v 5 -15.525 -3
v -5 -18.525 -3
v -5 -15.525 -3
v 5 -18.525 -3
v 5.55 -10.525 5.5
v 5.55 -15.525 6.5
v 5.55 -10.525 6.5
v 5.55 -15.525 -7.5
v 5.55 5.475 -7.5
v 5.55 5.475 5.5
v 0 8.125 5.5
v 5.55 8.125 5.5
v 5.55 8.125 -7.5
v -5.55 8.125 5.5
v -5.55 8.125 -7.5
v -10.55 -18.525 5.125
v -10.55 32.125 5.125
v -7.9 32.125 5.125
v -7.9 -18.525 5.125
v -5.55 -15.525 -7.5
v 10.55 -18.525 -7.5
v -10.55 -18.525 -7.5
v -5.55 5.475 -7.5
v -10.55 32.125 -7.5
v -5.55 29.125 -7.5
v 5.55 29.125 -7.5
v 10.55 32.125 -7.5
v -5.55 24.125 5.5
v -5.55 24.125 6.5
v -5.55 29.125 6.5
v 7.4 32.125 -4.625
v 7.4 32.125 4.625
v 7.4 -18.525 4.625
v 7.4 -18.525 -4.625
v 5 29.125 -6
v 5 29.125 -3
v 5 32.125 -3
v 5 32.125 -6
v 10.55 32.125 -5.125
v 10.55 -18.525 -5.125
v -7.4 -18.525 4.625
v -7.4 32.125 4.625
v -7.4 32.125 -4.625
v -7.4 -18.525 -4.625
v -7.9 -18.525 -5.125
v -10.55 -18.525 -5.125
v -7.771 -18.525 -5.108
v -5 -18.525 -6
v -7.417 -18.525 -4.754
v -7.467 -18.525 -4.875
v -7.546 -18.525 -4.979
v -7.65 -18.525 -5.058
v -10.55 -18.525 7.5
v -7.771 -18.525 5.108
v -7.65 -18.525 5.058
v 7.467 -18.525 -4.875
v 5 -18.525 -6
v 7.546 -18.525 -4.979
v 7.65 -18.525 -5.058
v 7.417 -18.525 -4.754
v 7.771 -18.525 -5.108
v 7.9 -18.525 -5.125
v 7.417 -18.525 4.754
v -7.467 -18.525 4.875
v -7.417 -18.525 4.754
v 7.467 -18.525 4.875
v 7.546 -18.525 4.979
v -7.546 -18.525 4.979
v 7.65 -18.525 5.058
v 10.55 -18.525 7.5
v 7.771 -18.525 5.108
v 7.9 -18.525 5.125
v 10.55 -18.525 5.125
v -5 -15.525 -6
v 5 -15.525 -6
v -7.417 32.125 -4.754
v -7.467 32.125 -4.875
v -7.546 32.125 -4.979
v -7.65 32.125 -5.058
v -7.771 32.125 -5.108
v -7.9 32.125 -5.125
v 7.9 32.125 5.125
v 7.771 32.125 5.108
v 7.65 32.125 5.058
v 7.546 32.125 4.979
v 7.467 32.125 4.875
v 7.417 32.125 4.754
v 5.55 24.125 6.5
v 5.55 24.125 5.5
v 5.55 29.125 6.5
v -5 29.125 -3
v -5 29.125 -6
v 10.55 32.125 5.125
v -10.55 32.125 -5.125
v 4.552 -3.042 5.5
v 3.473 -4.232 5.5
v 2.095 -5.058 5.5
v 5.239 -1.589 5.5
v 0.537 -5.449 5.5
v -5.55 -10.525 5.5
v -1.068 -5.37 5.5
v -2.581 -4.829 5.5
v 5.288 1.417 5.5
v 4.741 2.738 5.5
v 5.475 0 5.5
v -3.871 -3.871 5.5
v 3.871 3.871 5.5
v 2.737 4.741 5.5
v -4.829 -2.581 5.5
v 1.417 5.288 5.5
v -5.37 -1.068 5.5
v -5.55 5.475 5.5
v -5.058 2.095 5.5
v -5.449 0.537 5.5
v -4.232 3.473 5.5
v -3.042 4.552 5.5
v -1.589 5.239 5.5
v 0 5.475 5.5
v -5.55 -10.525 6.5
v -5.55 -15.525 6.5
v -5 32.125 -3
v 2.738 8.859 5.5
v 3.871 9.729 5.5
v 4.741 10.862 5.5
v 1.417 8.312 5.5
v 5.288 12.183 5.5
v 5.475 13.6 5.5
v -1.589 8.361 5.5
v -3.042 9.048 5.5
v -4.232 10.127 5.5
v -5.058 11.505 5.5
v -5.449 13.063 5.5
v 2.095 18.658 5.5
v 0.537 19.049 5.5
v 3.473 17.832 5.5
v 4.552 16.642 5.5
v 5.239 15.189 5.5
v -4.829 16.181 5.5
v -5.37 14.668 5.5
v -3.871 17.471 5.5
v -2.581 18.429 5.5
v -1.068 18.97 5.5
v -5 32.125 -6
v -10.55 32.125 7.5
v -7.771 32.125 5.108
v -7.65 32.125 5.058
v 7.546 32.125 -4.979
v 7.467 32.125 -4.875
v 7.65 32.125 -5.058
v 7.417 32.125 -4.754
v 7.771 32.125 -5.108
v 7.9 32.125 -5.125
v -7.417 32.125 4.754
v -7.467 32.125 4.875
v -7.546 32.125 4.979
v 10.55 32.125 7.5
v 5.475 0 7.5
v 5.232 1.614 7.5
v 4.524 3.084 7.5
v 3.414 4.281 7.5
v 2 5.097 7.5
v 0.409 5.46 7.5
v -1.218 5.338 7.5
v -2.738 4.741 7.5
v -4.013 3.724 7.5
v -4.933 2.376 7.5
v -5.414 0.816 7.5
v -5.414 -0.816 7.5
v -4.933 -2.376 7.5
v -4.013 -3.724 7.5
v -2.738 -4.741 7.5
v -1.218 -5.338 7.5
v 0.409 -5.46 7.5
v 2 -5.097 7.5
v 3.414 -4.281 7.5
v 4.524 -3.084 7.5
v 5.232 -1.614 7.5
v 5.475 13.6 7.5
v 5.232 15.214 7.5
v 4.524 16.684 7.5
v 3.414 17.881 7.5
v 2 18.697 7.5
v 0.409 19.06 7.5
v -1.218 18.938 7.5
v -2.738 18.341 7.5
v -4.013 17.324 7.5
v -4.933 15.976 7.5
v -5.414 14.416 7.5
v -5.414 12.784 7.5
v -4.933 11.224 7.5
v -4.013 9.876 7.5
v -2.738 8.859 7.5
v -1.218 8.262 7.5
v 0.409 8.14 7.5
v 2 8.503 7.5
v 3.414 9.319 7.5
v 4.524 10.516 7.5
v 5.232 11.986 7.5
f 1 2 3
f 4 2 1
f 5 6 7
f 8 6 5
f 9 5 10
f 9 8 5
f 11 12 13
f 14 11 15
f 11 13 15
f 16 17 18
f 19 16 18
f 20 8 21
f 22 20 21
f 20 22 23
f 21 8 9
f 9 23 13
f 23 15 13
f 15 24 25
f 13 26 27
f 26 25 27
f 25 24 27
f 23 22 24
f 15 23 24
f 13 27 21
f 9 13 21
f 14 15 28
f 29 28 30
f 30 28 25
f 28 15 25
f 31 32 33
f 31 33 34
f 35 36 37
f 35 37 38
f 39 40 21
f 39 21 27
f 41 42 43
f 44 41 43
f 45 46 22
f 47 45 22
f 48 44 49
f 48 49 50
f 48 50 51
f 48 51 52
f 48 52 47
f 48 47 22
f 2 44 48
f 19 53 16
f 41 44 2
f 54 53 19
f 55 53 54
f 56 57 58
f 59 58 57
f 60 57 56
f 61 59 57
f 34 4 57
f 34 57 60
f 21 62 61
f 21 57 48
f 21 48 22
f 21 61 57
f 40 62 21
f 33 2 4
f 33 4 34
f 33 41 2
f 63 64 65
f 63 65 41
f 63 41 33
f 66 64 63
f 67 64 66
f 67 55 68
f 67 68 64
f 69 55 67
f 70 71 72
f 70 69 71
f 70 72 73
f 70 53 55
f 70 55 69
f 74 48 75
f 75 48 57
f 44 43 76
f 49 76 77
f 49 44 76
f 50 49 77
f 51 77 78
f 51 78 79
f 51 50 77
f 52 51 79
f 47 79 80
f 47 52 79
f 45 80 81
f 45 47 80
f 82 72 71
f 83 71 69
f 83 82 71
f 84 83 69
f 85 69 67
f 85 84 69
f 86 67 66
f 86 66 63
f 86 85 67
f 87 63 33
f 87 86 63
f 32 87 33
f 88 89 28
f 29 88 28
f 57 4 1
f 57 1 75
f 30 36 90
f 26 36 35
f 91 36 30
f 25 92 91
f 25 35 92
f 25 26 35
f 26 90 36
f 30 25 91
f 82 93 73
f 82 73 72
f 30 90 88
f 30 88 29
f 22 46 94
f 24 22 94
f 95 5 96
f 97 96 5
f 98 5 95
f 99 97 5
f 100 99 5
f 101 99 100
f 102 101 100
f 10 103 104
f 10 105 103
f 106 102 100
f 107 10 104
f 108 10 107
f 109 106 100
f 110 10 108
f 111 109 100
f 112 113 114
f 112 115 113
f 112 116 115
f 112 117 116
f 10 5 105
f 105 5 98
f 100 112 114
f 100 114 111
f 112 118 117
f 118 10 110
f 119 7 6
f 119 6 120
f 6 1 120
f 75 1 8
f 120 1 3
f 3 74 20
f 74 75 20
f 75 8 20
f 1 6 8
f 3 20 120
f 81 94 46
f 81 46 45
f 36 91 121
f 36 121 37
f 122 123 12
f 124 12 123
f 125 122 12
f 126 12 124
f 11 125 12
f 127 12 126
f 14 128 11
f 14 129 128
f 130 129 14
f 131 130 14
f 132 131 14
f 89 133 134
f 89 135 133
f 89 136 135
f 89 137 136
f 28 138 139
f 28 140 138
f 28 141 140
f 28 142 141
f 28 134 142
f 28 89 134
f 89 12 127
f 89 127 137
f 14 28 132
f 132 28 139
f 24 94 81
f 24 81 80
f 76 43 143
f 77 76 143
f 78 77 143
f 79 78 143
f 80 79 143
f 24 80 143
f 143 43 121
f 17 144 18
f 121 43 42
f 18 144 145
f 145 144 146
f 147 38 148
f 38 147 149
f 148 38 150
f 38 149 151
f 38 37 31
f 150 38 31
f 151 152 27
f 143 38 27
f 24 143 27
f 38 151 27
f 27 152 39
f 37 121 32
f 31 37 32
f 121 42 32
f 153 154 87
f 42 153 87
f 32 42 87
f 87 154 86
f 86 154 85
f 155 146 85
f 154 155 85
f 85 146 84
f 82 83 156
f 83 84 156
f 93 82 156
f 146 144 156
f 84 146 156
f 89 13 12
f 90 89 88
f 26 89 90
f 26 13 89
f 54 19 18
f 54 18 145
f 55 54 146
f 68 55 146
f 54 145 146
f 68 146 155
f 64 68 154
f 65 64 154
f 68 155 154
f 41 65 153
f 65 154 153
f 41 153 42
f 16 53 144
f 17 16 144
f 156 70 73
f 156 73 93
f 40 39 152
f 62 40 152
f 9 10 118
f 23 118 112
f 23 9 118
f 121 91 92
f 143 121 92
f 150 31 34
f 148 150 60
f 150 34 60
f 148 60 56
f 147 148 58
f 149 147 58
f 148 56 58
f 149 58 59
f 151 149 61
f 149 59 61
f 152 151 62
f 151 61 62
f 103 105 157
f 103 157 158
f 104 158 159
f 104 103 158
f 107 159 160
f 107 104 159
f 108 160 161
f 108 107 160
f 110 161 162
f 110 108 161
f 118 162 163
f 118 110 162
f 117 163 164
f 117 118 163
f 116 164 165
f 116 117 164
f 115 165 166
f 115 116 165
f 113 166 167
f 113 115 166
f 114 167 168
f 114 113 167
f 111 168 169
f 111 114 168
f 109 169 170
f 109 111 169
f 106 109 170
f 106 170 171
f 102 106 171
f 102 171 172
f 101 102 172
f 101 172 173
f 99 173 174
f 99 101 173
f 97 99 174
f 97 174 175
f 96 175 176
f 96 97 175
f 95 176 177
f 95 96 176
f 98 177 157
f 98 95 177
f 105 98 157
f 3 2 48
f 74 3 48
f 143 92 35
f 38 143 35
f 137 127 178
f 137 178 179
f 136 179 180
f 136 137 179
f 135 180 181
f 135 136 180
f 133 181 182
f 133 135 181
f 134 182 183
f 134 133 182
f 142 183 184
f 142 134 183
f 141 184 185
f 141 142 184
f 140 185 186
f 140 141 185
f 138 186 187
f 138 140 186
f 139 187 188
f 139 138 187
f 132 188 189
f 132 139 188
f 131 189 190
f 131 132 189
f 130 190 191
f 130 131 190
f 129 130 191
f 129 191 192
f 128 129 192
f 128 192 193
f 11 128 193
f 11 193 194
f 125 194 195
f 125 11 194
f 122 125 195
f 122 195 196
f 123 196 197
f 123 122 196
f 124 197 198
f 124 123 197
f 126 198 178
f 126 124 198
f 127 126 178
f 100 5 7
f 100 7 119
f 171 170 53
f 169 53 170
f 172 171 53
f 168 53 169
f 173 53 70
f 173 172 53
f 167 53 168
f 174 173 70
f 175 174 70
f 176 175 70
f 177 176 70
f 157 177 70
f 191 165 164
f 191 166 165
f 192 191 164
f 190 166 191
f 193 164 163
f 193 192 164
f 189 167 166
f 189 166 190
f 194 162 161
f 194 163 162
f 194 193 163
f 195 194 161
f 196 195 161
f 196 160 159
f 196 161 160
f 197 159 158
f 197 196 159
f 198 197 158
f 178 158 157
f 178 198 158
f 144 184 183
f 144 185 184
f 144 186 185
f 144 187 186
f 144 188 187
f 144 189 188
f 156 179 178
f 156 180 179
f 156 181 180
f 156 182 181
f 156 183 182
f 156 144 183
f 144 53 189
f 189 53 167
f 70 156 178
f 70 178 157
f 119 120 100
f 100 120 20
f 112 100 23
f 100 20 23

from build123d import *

# Parameters (mm, degrees)
SKETCH2_W               = 21.1
SKETCH2_H               = 50.65
SKETCH2_R               = 5.475
BOSS_EXTRUDE1_DEPTH     = 7.5
SKETCH3_W               = 3.15
SKETCH3_H               = 10.25
CUT_EXTRUDE1_DEPTH      = 53.277863384
SKETCH4_W               = 11.1
SKETCH4_H               = 21
CUT_EXTRUDE2_DEPTH      = 13
FILLET1_R               = 0.5
CUT_EXTRUDE3_DEPTH      = 53.277863384
CUT_EXTRUDE3_DEPTH_BACK = 24
SKETCH6_W               = 10
SKETCH6_H               = 3
CUT_EXTRUDE4_START      = -50.65
SKETCH6_2_W             = 10
SKETCH6_2_H             = 3
CUT_EXTRUDE4_DEPTH      = 24
SKETCH7_W               = 11.1
SKETCH7_H               = 5
CUT_EXTRUDE5_DEPTH      = 1


with BuildPart() as part:
    # Sketch2 → Boss-Extrude1 (new, symmetric)
    with BuildSketch(Plane.XY):
        with Locations((0, 6.8)):
            Rectangle(SKETCH2_W, SKETCH2_H)
        Circle(SKETCH2_R, mode=Mode.SUBTRACT)
        with Locations((0, 13.6)):
            Circle(SKETCH2_R, mode=Mode.SUBTRACT)
    extrude(amount=BOSS_EXTRUDE1_DEPTH, both=True)

    # Sketch3 → Cut-Extrude1 (cut, symmetric)
    with BuildSketch(Plane(origin=(0, 32.125, 0), x_dir=(1, 0, 0), z_dir=(0, 1, 0))):
        with Locations((-8.975, 0)):
            Rectangle(SKETCH3_W, SKETCH3_H)
    cut_extrude1 = extrude(amount=CUT_EXTRUDE1_DEPTH, both=True, mode=Mode.SUBTRACT)

    # Mirror1: Cut-Extrude1 across plane
    add(cut_extrude1.mirror(Plane(origin=(0, 0, 0), x_dir=(0, 0, 1), z_dir=(1, 0, 0))), mode=Mode.SUBTRACT)

    # Sketch4 → Cut-Extrude2 (cut)
    with BuildSketch(Plane(origin=(0, 0, -7.5), x_dir=(-1, 0, 0), z_dir=(0, 0, -1))):
        with Locations((0, -5.025)):
            Rectangle(SKETCH4_W, SKETCH4_H)
        with Locations((0, 18.625)):
            Rectangle(SKETCH4_W, SKETCH4_H)
    extrude(amount=-CUT_EXTRUDE2_DEPTH, mode=Mode.SUBTRACT)

    # Fillet1
    fillet1_edges = [part.edges().sort_by_distance(p)[0] for p in [
        (-7.4, 6.8, -5.125),
        (-7.4, 6.8, 5.125),
        (7.4, 6.8, 5.125),
        (7.4, 6.8, -5.125),
    ]]
    fillet(fillet1_edges, radius=FILLET1_R)

    # Sketch6 → Cut-Extrude3 (cut, two sides: drawn at the far end of the back side and taken through both)
    with BuildSketch(Plane(origin=(0, 32.125, 0), x_dir=(1, 0, 0), z_dir=(0, 1, 0)).offset(-CUT_EXTRUDE3_DEPTH_BACK)):
        with Locations((0, 4.5)):
            Rectangle(SKETCH6_W, SKETCH6_H)
    extrude(amount=CUT_EXTRUDE3_DEPTH + CUT_EXTRUDE3_DEPTH_BACK, mode=Mode.SUBTRACT)

    # Sketch6<2> → Cut-Extrude4 (cut)
    with BuildSketch(Plane(origin=(0, 32.125, 0), x_dir=(1, 0, 0), z_dir=(0, 1, 0)).offset(CUT_EXTRUDE4_START)):
        with Locations((0, 4.5)):
            Rectangle(SKETCH6_2_W, SKETCH6_2_H)
    extrude(amount=CUT_EXTRUDE4_DEPTH, mode=Mode.SUBTRACT)

    # Sketch7 → Cut-Extrude5 (cut)
    with BuildSketch(Plane(origin=(0, 0, 5.5), x_dir=(-1, 0, 0), z_dir=(0, 0, -1))):
        with Locations((0, 26.625)):
            Rectangle(SKETCH7_W, SKETCH7_H)
        with Locations((0, -13.025)):
            Rectangle(SKETCH7_W, SKETCH7_H)
    extrude(amount=-CUT_EXTRUDE5_DEPTH, mode=Mode.SUBTRACT)


solid = part.part
